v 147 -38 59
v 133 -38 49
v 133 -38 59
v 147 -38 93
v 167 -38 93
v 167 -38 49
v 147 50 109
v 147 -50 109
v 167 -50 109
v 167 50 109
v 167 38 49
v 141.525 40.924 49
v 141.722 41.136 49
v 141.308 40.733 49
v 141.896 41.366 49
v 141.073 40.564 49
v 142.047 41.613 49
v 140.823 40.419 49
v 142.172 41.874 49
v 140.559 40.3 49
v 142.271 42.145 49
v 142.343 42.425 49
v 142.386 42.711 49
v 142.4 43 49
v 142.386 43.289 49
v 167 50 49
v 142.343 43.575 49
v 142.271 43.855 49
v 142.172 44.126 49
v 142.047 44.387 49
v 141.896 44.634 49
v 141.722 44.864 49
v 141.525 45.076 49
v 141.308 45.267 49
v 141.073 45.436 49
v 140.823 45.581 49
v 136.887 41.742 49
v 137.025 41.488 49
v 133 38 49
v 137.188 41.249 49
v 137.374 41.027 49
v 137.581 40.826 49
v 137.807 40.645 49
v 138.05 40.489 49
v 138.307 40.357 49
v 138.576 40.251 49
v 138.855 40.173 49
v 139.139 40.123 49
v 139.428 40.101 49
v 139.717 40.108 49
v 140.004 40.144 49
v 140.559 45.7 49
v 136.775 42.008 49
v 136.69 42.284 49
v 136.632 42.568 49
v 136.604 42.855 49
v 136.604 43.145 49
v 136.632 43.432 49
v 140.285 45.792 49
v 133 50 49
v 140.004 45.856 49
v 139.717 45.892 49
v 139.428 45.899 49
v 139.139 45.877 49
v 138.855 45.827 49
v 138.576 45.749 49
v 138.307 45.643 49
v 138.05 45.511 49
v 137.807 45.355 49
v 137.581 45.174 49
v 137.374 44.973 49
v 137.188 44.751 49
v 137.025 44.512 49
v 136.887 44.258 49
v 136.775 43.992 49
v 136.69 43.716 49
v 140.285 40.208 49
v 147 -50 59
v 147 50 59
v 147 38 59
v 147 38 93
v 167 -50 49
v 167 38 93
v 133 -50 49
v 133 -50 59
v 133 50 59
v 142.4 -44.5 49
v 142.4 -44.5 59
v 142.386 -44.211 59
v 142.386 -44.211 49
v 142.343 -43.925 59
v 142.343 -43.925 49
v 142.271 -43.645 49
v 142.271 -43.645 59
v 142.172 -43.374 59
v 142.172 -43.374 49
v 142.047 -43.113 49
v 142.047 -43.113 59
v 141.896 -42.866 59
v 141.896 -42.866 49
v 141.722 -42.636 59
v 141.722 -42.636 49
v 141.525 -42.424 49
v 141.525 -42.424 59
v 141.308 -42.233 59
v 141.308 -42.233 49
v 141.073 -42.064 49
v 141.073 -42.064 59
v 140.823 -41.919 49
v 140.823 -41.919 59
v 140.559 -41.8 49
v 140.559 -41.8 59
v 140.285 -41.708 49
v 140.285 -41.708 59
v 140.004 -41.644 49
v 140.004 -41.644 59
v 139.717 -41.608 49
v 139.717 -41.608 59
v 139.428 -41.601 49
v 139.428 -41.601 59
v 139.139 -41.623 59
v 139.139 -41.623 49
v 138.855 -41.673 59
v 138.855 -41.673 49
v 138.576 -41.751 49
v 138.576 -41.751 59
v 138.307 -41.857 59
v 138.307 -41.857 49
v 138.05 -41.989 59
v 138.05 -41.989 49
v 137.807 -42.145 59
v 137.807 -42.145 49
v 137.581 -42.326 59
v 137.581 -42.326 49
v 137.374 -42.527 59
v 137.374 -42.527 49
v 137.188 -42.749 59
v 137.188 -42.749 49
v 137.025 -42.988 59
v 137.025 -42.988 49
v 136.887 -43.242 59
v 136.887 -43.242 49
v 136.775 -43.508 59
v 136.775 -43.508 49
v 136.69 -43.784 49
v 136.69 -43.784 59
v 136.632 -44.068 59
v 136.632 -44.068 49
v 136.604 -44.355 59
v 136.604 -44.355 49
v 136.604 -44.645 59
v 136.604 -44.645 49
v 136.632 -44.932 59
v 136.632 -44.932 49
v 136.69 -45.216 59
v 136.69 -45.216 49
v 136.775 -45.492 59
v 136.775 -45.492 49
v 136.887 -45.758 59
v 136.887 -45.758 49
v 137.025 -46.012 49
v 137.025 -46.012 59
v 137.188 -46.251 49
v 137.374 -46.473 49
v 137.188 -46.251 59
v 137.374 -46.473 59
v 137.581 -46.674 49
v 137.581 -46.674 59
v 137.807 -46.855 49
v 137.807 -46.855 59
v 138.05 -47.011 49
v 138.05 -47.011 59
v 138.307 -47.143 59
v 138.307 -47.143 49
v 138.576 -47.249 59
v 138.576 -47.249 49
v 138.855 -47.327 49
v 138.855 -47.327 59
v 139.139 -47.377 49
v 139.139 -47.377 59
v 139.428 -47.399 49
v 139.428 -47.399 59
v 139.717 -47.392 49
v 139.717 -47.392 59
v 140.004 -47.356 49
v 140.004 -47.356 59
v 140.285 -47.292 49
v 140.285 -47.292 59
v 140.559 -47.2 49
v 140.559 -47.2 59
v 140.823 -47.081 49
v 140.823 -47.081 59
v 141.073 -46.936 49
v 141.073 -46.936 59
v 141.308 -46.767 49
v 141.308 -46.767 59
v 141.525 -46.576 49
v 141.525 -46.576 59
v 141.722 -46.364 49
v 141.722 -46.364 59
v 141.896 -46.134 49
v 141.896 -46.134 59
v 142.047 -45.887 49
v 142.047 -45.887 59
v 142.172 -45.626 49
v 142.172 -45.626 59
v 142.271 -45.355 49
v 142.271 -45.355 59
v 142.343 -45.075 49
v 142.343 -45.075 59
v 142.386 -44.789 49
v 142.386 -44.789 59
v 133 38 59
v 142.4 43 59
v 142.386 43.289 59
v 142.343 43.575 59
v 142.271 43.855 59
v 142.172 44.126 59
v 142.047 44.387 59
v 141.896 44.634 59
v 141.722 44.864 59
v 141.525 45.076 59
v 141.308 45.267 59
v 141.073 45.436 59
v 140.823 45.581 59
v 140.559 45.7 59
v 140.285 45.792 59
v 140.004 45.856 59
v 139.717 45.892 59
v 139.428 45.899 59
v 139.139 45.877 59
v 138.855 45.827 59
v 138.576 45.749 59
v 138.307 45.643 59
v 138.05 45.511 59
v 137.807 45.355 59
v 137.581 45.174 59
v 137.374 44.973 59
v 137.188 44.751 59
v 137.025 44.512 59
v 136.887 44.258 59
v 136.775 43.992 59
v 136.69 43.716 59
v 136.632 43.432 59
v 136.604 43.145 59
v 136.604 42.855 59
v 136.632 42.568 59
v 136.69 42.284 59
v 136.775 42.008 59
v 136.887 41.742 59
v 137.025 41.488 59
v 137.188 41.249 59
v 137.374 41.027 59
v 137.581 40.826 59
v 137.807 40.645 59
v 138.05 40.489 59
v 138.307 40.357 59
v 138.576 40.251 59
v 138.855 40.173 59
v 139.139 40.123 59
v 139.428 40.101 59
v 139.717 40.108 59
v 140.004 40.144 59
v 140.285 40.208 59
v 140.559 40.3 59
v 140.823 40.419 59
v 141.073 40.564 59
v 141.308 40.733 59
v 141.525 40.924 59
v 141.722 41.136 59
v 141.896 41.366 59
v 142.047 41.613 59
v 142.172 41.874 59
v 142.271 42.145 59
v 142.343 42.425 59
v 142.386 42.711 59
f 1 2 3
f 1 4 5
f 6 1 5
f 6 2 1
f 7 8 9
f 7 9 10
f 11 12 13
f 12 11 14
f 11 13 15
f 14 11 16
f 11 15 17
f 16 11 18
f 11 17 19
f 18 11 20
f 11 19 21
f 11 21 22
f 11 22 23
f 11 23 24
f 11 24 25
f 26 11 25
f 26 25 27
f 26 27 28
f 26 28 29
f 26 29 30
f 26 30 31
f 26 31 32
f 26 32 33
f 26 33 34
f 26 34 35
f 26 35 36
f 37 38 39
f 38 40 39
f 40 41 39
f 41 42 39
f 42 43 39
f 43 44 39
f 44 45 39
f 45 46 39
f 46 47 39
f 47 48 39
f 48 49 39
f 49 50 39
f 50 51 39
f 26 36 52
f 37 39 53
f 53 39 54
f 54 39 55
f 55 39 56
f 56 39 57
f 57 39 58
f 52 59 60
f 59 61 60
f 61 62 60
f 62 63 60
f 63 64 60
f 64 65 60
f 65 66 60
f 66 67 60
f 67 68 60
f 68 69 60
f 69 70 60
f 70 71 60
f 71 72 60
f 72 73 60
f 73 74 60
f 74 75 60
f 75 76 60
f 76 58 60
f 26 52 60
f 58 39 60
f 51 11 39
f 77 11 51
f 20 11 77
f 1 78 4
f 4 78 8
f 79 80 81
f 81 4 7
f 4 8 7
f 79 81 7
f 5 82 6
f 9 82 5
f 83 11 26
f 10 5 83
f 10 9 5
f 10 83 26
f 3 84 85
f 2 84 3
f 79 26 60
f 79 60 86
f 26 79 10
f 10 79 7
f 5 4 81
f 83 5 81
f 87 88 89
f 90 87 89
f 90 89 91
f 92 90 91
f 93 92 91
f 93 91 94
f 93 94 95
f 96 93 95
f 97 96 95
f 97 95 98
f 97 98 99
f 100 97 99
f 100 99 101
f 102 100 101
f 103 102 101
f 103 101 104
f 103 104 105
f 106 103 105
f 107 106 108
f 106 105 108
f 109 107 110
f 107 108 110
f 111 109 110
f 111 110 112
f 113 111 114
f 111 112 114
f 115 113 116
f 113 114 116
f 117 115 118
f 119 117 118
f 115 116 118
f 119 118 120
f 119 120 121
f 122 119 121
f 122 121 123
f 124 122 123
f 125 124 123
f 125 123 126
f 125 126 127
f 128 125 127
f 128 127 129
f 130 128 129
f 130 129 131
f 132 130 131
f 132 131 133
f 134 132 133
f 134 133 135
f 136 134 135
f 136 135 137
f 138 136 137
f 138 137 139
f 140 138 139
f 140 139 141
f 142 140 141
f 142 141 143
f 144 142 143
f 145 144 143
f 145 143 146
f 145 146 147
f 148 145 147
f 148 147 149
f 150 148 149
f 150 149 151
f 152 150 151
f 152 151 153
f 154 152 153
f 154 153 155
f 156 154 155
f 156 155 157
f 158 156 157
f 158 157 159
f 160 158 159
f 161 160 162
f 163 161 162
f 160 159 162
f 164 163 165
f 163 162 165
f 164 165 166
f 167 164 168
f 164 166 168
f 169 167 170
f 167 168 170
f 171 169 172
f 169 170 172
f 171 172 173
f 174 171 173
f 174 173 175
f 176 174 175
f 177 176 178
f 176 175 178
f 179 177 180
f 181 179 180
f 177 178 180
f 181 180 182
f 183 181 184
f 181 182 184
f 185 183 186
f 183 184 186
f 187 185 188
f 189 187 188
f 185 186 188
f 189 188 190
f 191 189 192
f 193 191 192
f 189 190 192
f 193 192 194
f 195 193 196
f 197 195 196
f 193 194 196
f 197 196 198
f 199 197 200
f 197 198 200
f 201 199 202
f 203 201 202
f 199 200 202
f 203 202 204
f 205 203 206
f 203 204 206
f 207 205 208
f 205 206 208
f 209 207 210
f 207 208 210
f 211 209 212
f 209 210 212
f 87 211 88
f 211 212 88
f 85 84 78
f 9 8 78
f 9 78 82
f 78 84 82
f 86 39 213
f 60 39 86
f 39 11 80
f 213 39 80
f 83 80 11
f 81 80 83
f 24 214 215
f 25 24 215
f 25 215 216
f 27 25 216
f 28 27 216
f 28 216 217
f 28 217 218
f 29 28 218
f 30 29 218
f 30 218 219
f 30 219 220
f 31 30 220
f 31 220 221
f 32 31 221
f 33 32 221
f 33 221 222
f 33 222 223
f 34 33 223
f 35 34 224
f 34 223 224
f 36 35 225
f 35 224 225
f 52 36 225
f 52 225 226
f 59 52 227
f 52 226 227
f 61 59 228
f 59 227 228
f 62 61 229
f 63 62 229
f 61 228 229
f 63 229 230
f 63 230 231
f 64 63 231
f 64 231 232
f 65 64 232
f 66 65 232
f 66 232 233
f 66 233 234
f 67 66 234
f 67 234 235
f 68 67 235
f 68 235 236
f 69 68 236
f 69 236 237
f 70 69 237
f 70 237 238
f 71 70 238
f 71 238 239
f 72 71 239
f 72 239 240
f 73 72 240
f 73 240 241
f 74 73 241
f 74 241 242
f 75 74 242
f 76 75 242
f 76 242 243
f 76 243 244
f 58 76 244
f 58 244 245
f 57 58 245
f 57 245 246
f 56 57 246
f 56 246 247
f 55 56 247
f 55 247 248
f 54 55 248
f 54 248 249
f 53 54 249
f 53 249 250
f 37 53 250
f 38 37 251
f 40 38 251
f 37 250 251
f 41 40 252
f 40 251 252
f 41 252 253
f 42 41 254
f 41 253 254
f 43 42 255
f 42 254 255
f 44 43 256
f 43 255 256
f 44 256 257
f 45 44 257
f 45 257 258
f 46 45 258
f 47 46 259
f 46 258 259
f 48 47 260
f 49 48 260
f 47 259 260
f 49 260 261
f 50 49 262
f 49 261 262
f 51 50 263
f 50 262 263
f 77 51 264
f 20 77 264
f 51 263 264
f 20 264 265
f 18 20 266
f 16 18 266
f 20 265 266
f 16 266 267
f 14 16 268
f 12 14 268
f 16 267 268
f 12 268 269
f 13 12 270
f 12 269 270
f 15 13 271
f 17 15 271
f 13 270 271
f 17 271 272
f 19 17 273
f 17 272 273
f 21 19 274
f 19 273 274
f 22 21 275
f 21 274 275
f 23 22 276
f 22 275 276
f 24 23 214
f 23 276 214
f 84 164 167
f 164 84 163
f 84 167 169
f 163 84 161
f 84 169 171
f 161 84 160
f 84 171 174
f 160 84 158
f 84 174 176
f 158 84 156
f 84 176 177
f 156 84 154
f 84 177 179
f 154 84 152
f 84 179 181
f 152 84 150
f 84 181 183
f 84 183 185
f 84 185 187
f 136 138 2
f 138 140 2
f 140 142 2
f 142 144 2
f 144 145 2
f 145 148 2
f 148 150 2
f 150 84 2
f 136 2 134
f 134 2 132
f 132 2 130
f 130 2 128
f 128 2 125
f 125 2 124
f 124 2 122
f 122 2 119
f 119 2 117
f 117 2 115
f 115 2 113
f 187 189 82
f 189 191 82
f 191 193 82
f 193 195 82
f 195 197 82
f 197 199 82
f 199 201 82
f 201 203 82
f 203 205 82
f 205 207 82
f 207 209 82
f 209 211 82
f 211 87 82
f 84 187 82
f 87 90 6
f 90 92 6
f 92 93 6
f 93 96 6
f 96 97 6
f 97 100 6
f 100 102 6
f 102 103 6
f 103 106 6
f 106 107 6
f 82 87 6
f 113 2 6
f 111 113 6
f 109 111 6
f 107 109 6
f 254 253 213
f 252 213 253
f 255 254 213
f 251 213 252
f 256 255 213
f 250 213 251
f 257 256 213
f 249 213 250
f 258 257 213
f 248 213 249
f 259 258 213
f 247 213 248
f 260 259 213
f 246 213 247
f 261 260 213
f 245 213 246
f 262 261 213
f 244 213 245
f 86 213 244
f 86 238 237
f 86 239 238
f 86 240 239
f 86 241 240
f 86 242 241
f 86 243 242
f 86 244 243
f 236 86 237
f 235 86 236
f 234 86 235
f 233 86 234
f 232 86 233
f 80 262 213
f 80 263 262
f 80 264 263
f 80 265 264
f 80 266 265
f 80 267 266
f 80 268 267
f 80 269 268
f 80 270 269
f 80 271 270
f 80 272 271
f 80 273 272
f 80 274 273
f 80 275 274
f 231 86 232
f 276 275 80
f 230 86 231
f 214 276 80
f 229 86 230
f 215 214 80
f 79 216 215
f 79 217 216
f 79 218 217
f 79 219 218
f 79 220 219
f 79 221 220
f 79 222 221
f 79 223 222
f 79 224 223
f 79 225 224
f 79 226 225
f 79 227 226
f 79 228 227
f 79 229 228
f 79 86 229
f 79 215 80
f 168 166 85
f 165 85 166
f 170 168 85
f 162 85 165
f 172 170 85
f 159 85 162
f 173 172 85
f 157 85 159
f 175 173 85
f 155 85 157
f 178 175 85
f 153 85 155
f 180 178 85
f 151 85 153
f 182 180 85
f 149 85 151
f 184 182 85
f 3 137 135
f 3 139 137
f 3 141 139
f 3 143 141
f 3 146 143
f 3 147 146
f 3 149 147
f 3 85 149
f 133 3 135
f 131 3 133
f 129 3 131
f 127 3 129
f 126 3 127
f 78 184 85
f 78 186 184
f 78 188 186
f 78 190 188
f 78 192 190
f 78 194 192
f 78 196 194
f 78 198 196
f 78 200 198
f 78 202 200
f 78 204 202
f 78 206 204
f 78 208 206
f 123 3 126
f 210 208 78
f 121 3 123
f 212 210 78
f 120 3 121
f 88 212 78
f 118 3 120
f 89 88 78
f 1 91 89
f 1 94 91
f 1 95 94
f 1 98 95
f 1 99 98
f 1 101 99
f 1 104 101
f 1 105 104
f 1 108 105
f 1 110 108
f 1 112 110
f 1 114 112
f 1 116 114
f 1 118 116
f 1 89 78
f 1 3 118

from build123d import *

# Parameters (mm, degrees)
SKETCH132_W   = 12
SKETCH132_H   = 44
SKETCH132_W_2 = 100
SKETCH132_H_2 = 16
PAD051_DEPTH  = 20
SKETCH134_W   = 15
SKETCH134_H   = 12
PAD052_DEPTH  = 10
SKETCH133_R   = 2.9
HOLE008_DEPTH = 25


with BuildPart() as part:
    # Sketch132 → Pad051 (new body)
    with BuildSketch(Plane.YZ):
        with Locations((-42, 60)):
            Rectangle(SKETCH132_W, SKETCH132_H)
        with Locations((46, 60)):
            Rectangle(SKETCH132_W, SKETCH132_H)
        with Locations((2, 90)):
            Rectangle(SKETCH132_W_2, SKETCH132_H_2)
    extrude(amount=PAD051_DEPTH)

    # Sketch134 → Pad052 (join)
    with BuildSketch(Plane.XY.offset(38)):
        with Locations((-6.5, -42)):
            Rectangle(SKETCH134_W, SKETCH134_H)
        with Locations((-6.5, 46)):
            Rectangle(SKETCH134_W, SKETCH134_H)
    extrude(amount=PAD052_DEPTH)

    # Sketch133 → Hole008 (cut)
    with BuildSketch(Plane.XY.offset(48)):
        with Locations((-7.5, 45)):
            Circle(SKETCH133_R)
        with Locations((-7.5, -42.5)):
            Circle(SKETCH133_R)
    extrude(amount=-HOLE008_DEPTH, mode=Mode.SUBTRACT)


with BuildPart() as part_1:
    # Body080 placement: moved
    add(part.part.moved(Location((147, -2, 11))))


solid = part_1.part
